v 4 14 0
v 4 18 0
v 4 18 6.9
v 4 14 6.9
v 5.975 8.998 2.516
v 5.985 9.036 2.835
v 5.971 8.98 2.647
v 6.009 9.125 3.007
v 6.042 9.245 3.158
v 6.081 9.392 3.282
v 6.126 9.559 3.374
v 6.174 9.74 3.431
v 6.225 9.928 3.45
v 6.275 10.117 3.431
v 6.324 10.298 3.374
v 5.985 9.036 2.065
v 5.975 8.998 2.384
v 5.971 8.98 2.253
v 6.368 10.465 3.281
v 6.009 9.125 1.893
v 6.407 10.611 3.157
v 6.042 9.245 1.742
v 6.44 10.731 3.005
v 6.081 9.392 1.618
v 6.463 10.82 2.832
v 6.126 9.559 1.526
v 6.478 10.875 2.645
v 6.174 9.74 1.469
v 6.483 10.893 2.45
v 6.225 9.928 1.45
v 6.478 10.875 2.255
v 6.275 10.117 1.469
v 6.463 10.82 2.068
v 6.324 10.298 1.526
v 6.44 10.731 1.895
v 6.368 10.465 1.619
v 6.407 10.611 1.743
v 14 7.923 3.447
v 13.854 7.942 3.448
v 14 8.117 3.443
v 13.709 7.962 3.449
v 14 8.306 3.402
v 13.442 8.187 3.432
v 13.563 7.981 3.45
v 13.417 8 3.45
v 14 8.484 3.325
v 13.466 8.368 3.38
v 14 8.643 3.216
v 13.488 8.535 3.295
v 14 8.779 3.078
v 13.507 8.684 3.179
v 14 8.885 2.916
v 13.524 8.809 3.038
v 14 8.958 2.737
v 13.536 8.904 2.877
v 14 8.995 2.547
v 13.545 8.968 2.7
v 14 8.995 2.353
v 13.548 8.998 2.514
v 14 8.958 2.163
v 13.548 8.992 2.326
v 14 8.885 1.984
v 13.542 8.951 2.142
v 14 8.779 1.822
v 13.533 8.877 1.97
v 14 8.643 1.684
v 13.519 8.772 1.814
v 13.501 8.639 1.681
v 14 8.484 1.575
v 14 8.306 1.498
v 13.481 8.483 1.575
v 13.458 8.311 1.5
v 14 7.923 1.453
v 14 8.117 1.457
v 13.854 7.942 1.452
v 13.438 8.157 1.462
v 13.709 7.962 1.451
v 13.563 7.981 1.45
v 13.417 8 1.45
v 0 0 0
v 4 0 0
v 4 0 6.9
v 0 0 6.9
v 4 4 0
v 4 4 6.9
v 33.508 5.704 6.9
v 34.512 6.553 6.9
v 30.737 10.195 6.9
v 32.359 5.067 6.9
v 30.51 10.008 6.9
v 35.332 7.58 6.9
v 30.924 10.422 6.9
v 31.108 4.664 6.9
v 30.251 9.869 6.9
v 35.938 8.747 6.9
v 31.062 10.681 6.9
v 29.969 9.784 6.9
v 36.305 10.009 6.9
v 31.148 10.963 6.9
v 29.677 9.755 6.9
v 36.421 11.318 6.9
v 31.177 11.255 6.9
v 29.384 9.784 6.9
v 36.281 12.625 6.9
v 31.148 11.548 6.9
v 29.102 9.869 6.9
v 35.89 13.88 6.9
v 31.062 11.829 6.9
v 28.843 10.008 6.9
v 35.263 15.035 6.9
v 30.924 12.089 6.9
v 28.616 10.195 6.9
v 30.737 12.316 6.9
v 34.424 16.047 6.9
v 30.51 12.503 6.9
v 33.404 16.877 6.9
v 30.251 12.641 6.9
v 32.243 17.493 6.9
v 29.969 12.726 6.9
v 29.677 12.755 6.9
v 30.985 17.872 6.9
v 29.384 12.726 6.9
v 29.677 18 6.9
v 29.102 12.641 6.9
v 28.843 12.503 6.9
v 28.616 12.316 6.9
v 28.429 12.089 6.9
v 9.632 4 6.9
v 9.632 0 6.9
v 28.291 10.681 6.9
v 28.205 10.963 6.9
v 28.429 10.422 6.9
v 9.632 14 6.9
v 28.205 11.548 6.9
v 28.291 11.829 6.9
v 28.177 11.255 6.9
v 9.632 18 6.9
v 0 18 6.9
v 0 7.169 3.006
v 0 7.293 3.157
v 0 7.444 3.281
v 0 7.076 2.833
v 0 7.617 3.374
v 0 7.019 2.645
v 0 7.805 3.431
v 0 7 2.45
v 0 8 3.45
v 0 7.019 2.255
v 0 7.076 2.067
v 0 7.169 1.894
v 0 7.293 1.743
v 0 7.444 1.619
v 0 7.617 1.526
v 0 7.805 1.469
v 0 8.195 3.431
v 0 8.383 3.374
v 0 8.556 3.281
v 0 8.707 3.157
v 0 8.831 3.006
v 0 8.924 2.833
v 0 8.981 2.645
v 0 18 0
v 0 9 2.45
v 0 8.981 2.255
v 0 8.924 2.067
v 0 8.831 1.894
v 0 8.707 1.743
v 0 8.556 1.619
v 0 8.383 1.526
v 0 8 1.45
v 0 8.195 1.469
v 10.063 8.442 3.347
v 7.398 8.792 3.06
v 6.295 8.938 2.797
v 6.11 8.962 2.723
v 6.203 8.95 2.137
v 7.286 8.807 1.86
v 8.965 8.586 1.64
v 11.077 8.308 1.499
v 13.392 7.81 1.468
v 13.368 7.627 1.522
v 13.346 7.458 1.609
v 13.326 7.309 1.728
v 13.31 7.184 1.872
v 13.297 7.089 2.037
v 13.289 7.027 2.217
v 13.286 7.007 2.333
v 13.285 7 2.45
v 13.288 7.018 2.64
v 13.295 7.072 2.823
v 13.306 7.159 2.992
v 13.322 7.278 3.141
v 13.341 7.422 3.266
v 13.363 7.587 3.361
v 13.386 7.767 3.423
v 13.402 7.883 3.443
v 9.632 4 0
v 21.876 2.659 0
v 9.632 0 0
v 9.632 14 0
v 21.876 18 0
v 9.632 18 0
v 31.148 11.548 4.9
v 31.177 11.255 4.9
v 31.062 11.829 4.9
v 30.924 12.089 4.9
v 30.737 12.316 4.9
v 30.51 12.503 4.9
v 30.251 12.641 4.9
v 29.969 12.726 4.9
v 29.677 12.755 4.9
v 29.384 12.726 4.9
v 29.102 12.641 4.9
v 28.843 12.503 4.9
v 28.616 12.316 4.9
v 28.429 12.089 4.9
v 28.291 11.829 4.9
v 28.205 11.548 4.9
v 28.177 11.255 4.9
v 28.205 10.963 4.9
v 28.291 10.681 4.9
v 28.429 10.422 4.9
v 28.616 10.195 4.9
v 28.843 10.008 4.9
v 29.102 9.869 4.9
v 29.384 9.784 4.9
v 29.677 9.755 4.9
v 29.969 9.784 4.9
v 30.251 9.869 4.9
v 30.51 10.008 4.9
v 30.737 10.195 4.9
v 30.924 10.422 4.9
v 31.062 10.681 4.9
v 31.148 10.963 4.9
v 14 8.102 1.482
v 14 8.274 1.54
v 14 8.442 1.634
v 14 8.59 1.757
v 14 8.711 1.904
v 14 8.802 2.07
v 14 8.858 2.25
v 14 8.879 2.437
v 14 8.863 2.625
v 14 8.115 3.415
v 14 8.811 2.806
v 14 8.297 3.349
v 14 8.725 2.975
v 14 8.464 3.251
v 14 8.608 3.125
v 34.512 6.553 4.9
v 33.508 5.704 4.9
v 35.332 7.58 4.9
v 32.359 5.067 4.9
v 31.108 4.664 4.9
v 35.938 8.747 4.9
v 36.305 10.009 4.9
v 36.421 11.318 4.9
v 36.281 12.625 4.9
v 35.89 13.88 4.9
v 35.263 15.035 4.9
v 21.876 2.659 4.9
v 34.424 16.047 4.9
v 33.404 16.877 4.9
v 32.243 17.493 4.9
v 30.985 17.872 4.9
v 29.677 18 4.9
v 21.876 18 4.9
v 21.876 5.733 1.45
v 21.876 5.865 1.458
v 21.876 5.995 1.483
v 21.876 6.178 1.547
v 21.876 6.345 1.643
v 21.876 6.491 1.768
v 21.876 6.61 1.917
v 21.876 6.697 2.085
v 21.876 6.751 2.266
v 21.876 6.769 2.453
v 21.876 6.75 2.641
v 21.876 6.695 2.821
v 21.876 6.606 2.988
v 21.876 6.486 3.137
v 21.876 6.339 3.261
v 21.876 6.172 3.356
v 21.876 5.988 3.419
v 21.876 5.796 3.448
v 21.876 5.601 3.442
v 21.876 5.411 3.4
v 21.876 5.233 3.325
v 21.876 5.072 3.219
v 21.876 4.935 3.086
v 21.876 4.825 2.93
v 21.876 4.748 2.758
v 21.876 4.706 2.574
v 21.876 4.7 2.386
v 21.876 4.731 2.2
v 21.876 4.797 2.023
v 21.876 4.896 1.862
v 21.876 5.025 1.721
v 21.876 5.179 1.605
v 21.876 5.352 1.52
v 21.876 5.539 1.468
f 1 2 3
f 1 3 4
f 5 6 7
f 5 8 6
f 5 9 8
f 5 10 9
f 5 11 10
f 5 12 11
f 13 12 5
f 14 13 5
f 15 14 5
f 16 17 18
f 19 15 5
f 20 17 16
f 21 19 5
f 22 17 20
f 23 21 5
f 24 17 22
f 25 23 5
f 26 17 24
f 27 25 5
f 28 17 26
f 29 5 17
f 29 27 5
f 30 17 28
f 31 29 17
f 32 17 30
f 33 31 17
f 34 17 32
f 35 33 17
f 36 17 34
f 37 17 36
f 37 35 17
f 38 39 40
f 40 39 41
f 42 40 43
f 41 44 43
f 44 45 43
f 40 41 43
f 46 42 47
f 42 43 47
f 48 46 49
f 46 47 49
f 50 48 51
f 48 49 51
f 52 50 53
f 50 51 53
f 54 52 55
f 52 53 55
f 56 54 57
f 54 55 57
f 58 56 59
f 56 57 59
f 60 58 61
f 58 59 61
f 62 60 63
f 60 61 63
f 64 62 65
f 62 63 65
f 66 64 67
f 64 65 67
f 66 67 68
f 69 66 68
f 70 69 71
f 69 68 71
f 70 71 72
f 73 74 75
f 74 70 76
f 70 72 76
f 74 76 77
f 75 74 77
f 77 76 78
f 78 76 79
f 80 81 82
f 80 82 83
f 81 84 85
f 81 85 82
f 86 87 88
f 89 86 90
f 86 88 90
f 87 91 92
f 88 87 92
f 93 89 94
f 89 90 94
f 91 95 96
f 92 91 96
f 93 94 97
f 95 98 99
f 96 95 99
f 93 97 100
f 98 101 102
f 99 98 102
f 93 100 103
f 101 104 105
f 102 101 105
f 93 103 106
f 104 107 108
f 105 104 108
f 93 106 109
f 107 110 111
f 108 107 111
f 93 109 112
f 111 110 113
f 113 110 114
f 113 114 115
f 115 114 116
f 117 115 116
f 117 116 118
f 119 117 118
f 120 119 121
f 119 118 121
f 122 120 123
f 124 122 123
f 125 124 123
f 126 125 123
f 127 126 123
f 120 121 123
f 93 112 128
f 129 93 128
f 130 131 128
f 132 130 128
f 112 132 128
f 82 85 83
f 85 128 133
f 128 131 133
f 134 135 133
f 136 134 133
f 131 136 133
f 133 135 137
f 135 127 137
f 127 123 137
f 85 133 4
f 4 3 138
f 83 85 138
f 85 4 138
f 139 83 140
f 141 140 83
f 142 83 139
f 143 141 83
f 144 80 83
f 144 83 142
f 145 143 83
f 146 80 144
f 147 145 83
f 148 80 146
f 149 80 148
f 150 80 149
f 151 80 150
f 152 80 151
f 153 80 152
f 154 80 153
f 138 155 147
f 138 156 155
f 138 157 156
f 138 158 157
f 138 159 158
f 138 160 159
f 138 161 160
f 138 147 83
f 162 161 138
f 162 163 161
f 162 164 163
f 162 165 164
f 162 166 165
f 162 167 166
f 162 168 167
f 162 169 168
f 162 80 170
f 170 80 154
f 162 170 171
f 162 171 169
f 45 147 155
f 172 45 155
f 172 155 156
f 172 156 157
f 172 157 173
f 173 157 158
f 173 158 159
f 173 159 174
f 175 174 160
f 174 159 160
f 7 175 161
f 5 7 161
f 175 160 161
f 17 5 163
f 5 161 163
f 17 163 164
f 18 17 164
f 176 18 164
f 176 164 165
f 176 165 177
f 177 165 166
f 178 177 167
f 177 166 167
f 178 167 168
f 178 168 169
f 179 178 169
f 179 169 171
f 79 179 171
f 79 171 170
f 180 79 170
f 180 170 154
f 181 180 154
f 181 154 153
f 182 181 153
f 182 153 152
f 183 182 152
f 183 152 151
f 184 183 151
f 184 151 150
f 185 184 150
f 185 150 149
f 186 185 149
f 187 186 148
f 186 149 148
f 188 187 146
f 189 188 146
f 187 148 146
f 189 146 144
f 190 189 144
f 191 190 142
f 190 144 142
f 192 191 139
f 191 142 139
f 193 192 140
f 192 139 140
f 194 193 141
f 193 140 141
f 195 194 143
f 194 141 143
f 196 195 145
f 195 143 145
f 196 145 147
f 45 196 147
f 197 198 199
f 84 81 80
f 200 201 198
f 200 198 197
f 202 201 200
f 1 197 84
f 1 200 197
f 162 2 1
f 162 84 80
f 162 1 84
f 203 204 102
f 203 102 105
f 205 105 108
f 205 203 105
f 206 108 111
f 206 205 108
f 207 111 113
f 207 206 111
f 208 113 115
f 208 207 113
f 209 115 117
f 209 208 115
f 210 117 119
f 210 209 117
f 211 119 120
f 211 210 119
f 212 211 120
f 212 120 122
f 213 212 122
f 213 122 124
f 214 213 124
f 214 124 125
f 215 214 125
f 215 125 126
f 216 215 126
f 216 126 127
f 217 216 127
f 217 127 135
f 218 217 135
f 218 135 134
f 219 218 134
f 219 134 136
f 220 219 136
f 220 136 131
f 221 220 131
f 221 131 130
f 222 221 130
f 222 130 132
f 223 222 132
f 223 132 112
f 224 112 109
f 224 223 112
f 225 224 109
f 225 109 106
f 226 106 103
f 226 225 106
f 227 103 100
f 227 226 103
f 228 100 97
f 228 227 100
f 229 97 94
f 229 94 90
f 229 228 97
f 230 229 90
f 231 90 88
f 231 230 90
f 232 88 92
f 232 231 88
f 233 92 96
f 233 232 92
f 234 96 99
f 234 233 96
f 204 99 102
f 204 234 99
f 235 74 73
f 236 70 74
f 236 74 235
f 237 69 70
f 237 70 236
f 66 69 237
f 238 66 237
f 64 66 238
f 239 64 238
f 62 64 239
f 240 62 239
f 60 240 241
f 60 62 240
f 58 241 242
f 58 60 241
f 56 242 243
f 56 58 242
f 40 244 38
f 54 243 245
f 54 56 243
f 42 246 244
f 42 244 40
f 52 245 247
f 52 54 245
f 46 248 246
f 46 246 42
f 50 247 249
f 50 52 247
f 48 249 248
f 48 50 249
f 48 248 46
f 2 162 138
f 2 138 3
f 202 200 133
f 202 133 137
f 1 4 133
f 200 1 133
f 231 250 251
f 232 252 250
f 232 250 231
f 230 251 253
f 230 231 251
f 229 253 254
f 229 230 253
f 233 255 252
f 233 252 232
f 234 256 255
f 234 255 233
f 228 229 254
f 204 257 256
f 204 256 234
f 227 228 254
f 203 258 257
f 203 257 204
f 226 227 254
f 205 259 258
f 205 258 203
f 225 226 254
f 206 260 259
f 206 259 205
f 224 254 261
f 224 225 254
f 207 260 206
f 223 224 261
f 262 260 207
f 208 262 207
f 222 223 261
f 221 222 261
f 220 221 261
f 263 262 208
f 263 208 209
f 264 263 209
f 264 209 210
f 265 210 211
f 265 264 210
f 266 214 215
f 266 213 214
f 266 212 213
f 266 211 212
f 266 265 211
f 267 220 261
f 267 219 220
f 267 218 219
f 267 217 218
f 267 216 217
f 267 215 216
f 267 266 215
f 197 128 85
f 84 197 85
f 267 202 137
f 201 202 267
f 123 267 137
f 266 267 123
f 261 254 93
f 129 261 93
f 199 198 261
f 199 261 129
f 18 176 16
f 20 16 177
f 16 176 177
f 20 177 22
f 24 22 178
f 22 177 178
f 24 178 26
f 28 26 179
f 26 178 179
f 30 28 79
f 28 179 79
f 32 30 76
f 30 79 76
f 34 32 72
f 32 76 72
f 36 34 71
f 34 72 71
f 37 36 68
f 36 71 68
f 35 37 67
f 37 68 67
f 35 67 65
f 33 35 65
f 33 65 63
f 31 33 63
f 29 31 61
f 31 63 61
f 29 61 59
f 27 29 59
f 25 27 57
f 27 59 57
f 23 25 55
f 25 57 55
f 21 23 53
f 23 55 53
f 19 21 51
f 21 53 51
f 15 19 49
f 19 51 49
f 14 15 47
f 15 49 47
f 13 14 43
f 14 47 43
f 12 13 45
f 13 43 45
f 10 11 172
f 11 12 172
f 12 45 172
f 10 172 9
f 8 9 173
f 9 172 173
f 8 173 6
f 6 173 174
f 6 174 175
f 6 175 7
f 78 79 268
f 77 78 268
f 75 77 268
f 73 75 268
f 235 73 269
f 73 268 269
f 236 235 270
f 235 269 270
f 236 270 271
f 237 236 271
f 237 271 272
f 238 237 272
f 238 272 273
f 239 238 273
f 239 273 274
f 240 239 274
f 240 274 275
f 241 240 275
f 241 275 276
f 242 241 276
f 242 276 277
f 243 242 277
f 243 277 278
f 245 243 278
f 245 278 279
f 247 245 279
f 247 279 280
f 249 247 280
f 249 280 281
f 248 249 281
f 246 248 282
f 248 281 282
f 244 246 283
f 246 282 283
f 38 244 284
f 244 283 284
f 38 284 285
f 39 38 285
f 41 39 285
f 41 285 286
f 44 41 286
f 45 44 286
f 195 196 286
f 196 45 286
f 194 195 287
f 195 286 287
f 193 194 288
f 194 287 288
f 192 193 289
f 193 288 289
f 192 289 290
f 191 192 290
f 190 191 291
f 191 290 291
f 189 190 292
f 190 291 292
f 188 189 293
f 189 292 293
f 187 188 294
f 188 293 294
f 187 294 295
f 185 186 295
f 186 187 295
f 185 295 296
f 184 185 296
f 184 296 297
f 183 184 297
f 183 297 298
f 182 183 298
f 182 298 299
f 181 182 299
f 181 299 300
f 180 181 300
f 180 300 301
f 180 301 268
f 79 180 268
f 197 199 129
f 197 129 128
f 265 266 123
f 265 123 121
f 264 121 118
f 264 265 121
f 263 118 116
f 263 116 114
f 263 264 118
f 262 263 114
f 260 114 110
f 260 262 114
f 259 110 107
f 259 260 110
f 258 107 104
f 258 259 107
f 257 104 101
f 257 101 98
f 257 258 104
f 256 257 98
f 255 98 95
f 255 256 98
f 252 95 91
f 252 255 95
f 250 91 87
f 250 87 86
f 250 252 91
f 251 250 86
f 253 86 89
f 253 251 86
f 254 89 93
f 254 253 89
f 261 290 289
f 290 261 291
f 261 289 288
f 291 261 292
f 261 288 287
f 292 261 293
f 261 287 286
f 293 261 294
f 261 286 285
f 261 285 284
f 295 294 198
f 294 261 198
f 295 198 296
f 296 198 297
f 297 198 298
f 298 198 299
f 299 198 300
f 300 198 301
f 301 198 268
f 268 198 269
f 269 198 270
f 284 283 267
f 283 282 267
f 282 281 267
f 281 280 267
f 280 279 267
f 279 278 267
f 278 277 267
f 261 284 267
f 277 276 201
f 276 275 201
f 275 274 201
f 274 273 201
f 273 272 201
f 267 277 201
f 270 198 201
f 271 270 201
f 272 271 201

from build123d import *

# Parameters (mm, degrees)
SKETCH1_R           = 1.5
BOSS_EXTRUDE1_DEPTH = 6.9
CUT_EXTRUDE2_DEPTH  = 4.9
SKETCH5_R           = 1
CUT_EXTRUDE3_DEPTH  = 14
SKETCH8_R           = 1
CUT_EXTRUDE5_DEPTH  = 17


with BuildPart() as part:
    # Sketch1 → Boss-Extrude1 (new body)
    with BuildSketch(Plane.XY):
        with BuildLine():
            Line((9.631516349, 18.000341084), (29.676516349, 18.000341084))
            ThreePointArc((29.676516349, 18.000341084), (36.383041872, 11.97511352), (31.10792826, 4.663887347))
            Line((31.10792826, 4.663887347), (9.631516349, 0))
            Line((9.631516349, 0), (9.631516349, 4))
            Line((9.631516349, 4), (4, 4))
            Line((4, 4), (4, 0))
            Line((4, 0), (0, 0))
            Line((0, 0), (0, 18.000341084))
            Line((0, 18.000341084), (4, 18.000341084))
            Line((4, 18.000341084), (4, 14.000341084))
            Line((4, 14.000341084), (9.631516349, 14.000341084))
            Line((9.631516349, 14.000341084), (9.631516349, 18.000341084))
        make_face()
        with Locations((29.676516349, 11.255296941)):
            Circle(SKETCH1_R, mode=Mode.SUBTRACT)
    extrude(amount=BOSS_EXTRUDE1_DEPTH)

    # Sketch4 → Cut-Extrude2 (cut)
    with BuildSketch(Plane.XY):
        with BuildLine():
            Line((21.876472206, 2.659154375), (21.876472206, 18.000341084))
            Line((21.876472206, 18.000341084), (29.676516349, 18.000341084))
            ThreePointArc((29.676516349, 18.000341084), (36.383041872, 11.97511352), (31.10792826, 4.663887347))
            Line((31.10792826, 4.663887347), (31.10792826, 2.659154375))
            Line((31.10792826, 2.659154375), (21.876472206, 2.659154375))
        make_face()
    extrude(amount=CUT_EXTRUDE2_DEPTH, mode=Mode.SUBTRACT)

    # Sketch5 → Cut-Extrude3 (cut)
    with BuildSketch(Plane.ZY):
        with Locations((2.45, 8)):
            Circle(SKETCH5_R)
    extrude(amount=-CUT_EXTRUDE3_DEPTH, mode=Mode.SUBTRACT)

    # Sketch8 → Cut-Extrude5 (cut)
    with BuildSketch(Plane(origin=(19.746237848, -5.290988485, 0), x_dir=(0, 0, -1), z_dir=(0.965925826, -0.258819045, 0))):
        with Locations((-2.45, 11.2)):
            Circle(SKETCH8_R)
    extrude(amount=-CUT_EXTRUDE5_DEPTH, mode=Mode.SUBTRACT)


solid = part.part
